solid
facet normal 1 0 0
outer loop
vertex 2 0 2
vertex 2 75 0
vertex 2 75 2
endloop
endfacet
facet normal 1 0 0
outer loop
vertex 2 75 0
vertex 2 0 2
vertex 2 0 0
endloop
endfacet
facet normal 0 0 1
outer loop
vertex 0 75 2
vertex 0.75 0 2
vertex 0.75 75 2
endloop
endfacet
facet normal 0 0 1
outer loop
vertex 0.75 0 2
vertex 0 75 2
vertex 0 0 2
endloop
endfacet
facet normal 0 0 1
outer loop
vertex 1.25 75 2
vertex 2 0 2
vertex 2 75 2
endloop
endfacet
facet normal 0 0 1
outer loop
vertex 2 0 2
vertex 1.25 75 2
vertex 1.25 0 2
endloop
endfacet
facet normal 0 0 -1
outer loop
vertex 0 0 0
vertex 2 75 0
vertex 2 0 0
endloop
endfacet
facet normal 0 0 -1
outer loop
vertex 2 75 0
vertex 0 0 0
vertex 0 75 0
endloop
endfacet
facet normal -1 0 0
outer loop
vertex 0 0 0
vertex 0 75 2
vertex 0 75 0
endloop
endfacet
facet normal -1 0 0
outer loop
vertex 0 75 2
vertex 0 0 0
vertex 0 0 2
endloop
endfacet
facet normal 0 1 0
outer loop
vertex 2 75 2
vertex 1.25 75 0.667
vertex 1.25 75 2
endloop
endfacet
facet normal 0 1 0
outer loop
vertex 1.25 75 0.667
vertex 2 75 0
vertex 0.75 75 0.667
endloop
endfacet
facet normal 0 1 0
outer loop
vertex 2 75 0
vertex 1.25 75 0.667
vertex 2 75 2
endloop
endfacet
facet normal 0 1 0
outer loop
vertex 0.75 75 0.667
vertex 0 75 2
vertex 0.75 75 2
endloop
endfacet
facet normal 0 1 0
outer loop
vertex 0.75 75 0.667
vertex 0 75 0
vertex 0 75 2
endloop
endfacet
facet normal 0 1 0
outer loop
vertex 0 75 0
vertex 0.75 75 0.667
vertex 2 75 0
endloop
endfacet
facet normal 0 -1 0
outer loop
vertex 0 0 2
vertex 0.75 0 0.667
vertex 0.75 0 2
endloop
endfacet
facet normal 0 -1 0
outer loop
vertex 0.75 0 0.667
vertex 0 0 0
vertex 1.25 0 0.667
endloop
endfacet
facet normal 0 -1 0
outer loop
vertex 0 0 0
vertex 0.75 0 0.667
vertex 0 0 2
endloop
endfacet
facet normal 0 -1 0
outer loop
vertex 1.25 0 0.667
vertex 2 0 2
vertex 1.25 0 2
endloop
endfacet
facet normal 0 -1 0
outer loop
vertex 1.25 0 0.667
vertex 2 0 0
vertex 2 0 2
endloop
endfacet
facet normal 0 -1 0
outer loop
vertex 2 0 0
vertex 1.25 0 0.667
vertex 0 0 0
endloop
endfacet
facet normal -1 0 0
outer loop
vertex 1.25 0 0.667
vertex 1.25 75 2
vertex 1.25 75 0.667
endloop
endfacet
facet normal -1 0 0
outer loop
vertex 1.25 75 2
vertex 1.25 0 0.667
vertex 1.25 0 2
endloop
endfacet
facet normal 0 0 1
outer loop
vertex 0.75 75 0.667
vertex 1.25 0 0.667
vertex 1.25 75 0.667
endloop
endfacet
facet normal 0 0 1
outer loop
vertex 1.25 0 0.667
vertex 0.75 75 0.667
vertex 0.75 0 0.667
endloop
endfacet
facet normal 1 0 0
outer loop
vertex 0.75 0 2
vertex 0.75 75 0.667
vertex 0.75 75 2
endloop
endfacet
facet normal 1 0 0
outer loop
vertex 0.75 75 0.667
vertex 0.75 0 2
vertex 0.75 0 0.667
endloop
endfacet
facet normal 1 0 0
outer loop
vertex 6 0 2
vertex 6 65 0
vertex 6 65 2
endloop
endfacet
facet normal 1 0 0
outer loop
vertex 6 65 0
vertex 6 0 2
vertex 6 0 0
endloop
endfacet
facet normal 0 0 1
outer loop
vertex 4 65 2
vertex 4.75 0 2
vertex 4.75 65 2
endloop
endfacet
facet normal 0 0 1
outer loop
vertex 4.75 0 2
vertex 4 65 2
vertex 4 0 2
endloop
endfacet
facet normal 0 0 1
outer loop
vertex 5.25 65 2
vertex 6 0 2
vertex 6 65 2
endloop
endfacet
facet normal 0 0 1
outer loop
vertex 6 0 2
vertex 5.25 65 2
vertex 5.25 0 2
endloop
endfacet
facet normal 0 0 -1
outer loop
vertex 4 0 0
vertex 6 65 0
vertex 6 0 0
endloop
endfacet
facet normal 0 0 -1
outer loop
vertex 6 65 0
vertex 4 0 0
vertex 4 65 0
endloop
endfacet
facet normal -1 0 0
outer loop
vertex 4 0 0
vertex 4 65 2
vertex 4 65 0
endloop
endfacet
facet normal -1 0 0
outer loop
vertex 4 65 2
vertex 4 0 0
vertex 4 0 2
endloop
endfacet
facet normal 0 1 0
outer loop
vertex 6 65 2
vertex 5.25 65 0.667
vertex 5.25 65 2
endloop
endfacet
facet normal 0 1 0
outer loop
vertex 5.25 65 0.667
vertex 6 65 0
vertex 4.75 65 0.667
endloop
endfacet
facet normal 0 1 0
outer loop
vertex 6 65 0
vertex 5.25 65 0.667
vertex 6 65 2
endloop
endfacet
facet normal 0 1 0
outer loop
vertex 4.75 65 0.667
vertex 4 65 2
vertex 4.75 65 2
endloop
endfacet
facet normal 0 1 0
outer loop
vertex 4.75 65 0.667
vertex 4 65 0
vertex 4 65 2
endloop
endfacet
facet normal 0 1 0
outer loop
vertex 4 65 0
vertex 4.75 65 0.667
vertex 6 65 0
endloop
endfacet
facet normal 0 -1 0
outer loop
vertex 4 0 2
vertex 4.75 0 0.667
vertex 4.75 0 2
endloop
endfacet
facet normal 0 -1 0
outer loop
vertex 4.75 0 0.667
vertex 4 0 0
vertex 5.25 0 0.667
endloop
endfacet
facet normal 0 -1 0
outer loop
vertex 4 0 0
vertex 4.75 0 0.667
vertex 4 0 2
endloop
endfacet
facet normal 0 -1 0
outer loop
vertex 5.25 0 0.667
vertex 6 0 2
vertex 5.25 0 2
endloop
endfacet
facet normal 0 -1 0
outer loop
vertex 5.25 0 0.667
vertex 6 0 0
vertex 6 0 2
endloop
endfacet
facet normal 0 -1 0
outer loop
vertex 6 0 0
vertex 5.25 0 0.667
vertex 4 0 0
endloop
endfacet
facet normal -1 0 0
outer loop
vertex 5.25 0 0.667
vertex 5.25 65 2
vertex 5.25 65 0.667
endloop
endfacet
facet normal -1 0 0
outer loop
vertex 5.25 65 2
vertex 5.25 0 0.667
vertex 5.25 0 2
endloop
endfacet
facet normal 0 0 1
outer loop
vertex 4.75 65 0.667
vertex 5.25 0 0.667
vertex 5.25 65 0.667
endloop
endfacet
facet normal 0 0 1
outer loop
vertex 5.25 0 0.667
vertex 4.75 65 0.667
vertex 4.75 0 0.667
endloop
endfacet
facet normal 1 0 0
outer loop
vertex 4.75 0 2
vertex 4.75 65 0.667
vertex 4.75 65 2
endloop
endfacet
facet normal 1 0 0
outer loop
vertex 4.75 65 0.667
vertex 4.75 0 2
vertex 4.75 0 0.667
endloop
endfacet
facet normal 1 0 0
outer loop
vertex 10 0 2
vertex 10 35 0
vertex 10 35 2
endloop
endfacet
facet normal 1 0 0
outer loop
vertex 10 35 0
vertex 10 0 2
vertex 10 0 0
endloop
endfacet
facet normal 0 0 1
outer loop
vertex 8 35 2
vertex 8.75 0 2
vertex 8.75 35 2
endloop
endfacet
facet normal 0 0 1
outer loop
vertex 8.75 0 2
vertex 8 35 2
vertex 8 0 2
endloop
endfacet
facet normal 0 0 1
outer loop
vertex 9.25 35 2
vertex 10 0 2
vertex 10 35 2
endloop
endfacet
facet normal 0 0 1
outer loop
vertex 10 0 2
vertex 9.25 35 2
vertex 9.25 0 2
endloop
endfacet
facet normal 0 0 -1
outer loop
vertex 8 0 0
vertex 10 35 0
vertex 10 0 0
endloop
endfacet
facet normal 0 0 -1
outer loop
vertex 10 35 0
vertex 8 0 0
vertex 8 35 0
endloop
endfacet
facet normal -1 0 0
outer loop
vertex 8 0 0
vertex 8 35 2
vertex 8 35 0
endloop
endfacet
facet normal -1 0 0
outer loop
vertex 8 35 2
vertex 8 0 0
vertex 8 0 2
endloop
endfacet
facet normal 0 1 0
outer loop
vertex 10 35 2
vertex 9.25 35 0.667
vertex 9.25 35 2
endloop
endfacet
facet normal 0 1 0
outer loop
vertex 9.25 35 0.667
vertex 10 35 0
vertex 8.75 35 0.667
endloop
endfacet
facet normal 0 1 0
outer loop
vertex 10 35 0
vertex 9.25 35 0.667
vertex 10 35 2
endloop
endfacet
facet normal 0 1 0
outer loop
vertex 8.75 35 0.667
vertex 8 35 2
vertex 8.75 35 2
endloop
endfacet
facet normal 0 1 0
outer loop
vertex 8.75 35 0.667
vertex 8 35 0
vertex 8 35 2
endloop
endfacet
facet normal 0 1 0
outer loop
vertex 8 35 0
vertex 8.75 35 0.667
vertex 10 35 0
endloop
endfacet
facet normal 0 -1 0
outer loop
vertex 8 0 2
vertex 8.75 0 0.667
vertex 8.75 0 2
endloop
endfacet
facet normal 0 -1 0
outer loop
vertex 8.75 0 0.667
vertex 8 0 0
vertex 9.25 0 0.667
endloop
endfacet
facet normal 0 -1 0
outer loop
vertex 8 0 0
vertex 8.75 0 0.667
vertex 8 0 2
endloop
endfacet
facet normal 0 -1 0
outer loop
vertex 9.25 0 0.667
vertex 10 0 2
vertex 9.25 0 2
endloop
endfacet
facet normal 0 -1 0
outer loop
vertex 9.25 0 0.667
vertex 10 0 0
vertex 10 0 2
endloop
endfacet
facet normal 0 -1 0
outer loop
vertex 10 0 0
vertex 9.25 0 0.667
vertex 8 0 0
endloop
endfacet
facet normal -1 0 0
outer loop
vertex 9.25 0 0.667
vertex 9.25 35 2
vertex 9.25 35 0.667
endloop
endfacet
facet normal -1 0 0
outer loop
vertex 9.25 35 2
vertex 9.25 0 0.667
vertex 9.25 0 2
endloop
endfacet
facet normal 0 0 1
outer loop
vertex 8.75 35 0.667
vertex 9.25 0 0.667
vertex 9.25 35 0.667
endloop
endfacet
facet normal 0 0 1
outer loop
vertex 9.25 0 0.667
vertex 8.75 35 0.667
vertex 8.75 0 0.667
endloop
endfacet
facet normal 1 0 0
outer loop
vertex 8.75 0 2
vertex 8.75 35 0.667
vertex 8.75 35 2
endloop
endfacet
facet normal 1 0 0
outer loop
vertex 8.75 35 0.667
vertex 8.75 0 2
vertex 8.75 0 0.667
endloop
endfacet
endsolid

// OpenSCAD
// Halter für die Abschirmung zwischen PA und RX

// Resolution for 3D printing:
$fa = 1;
$fs = 0.4;

// Allgemeines:
delta                  =   0.1; // Standard Durchdringung

holder_width           =   2.0;
holder_height          =   2.0;

slit_width             =   0.5;

holder1                =  75.0;
holder2                =  65.0;
holder3                =  35.0;

module holder(l) {
    difference() {
        cube([holder_width, l, holder_height]);
        translate([(holder_width - slit_width) / 2,
                   -delta,
                   holder_height / 3])
            cube([slit_width, l + 2*delta, holder_height]);
    };
};

holder(holder1);

translate([2*holder_width, 0, 0])
    holder(holder2);

translate([4*holder_width, 0, 0])
    holder(holder3);
